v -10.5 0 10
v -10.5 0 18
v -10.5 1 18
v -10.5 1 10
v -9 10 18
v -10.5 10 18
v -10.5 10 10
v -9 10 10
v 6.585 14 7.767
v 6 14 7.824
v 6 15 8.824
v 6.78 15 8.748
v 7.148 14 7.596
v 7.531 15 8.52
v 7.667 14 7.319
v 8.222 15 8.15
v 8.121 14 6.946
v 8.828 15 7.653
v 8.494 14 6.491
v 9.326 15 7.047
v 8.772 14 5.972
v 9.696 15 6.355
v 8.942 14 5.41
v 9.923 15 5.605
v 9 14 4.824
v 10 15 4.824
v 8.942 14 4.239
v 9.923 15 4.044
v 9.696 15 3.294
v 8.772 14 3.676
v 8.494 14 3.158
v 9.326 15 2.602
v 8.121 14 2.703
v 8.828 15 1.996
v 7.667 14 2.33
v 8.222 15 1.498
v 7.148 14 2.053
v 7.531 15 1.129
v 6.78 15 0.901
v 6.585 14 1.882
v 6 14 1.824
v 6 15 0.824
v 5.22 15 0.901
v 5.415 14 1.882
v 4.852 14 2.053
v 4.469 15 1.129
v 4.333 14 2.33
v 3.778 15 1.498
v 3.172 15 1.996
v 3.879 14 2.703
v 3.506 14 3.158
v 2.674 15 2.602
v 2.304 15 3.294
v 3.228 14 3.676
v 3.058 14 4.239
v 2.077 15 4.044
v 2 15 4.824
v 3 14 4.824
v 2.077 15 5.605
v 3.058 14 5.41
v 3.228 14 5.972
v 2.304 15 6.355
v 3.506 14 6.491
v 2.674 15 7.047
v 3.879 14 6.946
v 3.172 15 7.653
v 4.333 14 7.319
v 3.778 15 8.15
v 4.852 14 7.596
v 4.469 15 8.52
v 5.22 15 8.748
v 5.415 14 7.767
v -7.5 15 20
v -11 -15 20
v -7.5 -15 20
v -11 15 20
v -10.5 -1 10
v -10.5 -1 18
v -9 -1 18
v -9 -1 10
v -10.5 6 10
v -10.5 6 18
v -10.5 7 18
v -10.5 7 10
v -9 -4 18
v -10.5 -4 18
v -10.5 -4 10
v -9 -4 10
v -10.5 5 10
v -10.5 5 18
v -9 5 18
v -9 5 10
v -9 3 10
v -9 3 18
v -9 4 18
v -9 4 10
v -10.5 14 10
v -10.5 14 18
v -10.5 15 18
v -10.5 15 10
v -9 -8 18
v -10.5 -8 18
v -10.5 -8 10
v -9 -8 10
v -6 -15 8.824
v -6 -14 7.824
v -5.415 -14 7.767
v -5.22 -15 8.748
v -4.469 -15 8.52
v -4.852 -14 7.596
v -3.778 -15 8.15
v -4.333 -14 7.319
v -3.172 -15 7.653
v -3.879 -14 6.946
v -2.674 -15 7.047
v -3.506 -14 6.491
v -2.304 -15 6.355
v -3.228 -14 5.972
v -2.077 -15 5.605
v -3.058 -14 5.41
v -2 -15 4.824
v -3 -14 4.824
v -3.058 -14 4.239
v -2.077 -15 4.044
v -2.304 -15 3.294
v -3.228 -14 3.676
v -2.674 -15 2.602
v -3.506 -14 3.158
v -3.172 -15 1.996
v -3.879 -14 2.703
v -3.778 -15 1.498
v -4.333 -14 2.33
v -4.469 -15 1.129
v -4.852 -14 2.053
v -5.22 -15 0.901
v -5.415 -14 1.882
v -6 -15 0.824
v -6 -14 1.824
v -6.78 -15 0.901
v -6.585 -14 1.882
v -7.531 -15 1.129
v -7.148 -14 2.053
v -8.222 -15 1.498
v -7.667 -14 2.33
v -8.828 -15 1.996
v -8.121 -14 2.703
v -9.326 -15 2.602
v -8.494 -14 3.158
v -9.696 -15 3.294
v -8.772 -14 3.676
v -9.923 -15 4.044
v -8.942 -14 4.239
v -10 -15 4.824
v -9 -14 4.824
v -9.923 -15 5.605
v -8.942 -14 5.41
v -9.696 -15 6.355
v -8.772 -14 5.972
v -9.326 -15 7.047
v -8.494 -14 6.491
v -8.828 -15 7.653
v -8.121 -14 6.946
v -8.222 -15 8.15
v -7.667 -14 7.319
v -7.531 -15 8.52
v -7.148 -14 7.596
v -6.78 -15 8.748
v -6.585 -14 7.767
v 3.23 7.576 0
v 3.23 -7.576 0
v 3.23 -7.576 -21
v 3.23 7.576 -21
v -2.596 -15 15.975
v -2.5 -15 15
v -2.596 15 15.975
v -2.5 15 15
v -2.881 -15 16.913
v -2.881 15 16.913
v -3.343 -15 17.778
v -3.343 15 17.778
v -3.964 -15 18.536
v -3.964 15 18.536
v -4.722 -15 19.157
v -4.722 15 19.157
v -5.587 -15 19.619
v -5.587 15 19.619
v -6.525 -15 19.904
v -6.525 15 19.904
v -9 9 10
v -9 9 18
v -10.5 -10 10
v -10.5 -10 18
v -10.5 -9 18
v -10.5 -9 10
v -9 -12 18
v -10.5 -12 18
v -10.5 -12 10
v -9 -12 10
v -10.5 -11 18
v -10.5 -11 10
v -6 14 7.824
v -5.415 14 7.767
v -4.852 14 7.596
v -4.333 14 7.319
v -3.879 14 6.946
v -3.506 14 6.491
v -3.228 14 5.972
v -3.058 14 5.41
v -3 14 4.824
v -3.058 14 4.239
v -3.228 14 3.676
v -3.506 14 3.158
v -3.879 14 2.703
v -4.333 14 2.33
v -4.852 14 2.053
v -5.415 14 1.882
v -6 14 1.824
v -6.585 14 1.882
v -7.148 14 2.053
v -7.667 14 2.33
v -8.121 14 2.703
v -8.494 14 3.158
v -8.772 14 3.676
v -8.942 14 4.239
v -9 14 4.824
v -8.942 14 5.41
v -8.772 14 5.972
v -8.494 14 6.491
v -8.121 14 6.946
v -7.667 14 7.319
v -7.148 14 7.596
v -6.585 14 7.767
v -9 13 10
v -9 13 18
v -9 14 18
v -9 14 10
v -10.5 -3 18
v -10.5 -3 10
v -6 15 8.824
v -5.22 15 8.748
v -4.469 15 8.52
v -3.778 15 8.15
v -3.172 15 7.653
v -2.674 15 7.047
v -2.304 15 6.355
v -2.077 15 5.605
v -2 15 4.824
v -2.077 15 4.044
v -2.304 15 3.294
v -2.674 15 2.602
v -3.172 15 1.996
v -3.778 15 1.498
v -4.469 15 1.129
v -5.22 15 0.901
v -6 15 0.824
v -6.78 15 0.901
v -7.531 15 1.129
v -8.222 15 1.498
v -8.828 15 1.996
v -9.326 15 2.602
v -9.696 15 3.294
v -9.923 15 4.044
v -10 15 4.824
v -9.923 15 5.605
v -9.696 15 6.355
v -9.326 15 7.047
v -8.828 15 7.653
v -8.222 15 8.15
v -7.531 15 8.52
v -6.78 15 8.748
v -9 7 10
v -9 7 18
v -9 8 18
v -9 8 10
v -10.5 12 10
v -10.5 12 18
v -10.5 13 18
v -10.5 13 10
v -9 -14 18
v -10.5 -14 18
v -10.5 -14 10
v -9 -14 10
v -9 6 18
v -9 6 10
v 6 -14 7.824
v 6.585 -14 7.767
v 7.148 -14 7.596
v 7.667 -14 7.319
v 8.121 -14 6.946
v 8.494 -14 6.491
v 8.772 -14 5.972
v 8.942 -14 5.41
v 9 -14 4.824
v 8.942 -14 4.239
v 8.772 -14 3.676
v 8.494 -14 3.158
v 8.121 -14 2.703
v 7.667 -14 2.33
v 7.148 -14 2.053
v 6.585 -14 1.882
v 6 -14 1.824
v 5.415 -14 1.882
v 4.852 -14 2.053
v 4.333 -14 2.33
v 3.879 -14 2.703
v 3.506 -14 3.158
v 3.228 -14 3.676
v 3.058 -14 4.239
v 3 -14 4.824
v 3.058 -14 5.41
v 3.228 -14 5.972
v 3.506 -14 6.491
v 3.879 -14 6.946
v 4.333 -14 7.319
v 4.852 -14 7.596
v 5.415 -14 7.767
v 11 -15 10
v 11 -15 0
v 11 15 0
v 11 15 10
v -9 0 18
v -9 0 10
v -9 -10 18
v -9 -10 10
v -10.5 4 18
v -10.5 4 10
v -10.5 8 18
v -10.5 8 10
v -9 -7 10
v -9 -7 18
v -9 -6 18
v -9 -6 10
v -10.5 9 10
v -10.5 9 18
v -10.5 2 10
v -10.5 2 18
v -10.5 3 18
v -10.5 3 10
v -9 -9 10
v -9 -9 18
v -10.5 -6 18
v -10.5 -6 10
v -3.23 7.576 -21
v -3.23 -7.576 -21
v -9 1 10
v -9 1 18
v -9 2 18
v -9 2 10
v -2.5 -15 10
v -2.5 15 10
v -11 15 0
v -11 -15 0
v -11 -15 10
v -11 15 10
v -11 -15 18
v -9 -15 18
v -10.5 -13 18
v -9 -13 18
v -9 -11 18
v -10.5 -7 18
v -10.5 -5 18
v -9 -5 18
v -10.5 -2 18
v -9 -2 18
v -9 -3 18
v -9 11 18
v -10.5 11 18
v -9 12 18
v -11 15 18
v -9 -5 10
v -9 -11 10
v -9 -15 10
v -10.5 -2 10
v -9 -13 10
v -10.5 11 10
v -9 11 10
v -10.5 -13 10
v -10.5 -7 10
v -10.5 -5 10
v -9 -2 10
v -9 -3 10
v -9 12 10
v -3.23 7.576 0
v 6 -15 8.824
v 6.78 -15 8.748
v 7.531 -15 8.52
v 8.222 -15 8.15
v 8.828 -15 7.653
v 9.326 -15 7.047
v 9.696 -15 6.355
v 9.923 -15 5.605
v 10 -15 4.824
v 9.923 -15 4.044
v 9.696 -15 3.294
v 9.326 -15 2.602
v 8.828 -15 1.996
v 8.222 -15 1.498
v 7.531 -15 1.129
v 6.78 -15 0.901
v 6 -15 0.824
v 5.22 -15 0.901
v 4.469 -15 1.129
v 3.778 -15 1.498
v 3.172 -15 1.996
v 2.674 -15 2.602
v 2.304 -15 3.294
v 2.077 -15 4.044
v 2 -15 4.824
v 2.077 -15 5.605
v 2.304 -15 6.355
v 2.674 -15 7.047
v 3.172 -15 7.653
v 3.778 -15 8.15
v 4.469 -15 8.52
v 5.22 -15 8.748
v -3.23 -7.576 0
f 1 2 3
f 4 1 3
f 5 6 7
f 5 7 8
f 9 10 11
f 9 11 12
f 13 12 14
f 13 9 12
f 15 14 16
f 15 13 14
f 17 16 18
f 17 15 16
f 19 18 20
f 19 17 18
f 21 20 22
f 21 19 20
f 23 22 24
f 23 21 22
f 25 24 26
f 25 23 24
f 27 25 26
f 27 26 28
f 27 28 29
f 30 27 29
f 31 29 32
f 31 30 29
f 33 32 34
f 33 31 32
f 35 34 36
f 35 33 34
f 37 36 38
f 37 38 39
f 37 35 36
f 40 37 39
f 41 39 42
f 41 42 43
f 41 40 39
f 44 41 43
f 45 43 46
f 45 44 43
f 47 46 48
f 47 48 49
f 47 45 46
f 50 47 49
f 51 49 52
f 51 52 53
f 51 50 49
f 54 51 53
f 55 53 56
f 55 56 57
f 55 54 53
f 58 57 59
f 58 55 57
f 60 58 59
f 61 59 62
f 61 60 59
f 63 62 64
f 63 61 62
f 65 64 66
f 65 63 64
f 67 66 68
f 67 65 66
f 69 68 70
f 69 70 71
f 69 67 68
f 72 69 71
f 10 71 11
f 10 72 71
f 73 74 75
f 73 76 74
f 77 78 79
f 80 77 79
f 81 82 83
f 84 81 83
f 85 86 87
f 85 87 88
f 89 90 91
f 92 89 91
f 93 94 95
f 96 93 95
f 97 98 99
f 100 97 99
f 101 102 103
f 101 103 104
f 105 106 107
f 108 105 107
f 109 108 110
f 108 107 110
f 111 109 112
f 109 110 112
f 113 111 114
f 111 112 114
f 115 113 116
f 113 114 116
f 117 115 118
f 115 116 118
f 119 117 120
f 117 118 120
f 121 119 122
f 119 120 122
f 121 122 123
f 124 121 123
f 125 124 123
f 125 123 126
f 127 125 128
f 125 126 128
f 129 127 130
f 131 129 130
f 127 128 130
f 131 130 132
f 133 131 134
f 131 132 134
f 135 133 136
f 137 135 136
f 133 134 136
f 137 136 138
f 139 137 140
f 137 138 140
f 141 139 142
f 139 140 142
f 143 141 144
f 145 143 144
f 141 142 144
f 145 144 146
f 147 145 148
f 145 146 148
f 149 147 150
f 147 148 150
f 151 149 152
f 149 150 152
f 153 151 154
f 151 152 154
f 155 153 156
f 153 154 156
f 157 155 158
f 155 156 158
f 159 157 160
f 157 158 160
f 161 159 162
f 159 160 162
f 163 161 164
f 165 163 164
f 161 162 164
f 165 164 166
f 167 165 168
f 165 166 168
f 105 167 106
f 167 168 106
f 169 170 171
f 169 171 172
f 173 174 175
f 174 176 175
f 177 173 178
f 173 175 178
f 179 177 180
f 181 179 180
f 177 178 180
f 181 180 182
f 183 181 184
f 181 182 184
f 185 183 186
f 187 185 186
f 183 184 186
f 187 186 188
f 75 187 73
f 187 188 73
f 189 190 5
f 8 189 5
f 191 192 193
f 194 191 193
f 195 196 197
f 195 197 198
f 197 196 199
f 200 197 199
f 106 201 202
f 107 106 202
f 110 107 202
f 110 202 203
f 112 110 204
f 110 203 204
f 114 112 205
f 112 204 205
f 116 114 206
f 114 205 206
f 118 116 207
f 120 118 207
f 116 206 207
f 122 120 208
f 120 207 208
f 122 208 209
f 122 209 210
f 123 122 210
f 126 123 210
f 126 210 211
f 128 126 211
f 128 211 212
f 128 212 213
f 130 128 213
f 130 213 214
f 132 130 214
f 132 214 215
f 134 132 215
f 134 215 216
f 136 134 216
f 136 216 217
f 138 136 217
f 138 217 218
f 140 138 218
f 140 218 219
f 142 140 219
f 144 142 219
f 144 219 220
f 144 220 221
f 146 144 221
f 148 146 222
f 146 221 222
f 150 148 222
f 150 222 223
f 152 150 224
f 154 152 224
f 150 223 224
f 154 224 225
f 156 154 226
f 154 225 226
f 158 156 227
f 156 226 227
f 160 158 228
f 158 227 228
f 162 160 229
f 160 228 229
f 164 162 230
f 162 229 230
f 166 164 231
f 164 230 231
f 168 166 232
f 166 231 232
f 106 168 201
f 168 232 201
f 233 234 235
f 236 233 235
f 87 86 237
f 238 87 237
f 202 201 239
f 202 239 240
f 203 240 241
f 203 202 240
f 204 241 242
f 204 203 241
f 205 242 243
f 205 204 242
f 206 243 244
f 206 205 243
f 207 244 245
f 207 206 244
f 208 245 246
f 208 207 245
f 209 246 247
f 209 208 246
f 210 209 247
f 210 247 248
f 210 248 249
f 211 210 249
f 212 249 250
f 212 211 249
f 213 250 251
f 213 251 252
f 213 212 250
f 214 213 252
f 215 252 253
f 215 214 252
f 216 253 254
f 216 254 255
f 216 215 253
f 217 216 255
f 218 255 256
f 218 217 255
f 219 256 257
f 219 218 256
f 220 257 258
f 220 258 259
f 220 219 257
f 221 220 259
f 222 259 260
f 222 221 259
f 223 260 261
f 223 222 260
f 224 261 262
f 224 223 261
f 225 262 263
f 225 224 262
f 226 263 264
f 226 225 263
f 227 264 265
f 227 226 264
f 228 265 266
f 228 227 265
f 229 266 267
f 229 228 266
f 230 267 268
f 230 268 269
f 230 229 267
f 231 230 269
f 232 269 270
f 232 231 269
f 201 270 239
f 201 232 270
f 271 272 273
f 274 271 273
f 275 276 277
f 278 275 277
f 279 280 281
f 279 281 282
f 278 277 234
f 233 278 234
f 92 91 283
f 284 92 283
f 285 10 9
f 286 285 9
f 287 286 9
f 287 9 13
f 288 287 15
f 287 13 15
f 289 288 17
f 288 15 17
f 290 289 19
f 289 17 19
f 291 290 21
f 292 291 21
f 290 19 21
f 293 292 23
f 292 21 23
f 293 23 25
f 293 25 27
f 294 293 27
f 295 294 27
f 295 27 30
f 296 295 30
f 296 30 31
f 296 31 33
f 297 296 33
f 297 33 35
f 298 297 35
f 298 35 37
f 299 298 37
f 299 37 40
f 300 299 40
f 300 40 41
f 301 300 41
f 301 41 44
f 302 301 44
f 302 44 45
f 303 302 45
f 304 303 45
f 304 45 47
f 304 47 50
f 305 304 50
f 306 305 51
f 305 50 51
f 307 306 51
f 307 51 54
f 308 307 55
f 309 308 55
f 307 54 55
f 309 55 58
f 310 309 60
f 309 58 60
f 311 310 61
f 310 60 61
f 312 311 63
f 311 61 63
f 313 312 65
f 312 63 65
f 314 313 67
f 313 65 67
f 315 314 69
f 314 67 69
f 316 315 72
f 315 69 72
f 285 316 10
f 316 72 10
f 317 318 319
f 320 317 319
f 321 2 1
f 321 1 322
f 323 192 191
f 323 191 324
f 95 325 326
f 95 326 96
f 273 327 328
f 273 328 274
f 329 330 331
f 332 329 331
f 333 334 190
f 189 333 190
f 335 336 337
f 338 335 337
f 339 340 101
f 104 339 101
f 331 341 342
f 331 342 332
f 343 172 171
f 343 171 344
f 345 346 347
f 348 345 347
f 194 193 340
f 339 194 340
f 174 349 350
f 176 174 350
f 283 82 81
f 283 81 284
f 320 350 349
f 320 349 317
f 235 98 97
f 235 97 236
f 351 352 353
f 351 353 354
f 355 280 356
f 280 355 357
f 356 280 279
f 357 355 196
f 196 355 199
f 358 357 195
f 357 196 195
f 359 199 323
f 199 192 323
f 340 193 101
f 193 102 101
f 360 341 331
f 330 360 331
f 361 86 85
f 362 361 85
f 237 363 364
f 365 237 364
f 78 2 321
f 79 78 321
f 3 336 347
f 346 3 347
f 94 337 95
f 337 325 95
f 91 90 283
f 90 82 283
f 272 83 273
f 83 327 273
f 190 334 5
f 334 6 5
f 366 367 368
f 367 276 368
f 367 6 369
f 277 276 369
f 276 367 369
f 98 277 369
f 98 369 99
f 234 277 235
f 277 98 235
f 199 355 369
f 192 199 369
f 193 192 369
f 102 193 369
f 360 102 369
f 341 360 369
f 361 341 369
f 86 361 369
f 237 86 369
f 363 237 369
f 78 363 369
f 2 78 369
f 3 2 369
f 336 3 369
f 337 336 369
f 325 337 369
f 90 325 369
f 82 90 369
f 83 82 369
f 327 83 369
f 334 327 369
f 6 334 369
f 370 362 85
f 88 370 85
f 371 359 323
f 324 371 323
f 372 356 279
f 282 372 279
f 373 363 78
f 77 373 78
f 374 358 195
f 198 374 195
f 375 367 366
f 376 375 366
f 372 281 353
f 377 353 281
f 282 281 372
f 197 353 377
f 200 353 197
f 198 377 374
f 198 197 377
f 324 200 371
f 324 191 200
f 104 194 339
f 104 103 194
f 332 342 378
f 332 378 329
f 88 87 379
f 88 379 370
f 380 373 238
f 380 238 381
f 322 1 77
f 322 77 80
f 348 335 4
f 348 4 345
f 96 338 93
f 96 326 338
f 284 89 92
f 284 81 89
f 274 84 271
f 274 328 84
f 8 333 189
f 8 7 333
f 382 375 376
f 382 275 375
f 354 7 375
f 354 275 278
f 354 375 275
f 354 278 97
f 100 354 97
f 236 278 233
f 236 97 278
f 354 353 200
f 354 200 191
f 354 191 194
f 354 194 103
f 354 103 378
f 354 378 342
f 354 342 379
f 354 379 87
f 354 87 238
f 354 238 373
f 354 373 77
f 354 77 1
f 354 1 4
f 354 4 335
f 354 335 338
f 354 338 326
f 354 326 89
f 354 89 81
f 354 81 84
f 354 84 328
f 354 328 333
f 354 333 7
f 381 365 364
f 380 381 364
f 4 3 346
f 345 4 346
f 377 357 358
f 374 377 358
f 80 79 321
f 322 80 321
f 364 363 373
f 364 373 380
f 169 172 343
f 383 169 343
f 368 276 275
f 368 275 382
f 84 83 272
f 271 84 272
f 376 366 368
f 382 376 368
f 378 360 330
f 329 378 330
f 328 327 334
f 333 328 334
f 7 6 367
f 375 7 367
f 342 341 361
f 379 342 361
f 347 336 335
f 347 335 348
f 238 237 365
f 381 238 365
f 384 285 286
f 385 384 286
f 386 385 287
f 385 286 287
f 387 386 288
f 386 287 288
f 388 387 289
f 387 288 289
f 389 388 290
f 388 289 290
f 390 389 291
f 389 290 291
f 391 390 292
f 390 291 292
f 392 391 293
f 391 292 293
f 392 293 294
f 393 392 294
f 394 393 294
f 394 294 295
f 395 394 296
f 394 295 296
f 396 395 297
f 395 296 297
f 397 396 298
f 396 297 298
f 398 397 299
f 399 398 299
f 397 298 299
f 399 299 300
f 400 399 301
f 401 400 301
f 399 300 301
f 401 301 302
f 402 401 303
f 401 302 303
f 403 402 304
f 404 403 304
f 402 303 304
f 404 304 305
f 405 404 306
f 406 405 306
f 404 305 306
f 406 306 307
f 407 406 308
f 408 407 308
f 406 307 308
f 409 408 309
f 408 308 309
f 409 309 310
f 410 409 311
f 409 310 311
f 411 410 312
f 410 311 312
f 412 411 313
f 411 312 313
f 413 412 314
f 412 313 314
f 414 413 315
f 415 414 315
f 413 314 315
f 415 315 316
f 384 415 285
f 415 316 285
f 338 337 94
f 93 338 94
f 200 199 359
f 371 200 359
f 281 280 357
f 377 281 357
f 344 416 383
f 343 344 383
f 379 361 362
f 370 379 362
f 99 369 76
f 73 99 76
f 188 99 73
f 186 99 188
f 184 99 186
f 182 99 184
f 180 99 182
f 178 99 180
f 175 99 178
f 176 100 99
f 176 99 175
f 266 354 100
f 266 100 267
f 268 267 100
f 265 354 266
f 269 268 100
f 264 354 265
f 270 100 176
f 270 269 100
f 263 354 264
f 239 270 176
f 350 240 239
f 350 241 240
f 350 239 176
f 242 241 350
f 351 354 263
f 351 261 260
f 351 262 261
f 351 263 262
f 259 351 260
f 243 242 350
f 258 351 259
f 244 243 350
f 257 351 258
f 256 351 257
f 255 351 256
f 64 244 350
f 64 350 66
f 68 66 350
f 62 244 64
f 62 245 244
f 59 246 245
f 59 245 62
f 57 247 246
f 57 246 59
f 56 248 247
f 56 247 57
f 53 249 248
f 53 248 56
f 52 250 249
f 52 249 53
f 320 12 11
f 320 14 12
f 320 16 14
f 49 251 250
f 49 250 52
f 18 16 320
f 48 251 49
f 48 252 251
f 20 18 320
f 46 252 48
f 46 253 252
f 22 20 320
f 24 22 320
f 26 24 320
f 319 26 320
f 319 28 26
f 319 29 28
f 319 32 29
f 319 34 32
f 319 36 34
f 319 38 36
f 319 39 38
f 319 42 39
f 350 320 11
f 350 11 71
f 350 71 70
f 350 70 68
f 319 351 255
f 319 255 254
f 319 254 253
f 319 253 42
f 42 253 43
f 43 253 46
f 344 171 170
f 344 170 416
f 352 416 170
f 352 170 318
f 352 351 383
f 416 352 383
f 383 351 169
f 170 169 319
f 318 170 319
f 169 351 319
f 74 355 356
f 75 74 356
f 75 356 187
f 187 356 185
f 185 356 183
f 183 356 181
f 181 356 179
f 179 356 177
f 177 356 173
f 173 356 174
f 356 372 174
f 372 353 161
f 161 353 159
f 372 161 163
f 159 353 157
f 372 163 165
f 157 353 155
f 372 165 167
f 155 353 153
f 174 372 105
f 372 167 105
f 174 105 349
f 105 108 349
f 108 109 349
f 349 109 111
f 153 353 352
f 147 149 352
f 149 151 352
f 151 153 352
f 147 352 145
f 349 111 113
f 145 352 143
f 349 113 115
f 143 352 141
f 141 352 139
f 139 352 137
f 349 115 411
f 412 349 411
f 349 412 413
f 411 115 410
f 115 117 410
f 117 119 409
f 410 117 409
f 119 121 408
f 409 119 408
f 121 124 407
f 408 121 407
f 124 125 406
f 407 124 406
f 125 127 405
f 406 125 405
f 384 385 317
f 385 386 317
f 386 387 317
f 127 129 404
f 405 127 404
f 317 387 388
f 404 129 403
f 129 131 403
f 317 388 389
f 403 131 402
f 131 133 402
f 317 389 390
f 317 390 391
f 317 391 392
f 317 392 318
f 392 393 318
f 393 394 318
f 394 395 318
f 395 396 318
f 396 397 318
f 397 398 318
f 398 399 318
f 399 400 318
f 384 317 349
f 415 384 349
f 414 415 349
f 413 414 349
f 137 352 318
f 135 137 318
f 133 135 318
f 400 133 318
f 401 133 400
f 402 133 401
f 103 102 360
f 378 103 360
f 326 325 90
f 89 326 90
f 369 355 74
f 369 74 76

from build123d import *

# Parameters (mm, degrees)
SKETCH1_W           = 22
SKETCH1_H           = 30
BOSS_EXTRUDE1_DEPTH = 10
SKETCH2_R           = 3
CUT_EXTRUDE1_DEPTH  = 44
SKETCH3_W           = 8.5
SKETCH3_H           = 30
BOSS_EXTRUDE2_DEPTH = 10
SKETCH4_W           = 1.5
SKETCH4_H           = 1
CUT_EXTRUDE2_DEPTH  = 8
SKETCH5_W           = 6.460308978
SKETCH5_H           = 15.152222924
BOSS_EXTRUDE3_DEPTH = 21
CHAMFER1_SIZE       = 1
FILLET1_R           = 5


with BuildPart() as part:
    # Sketch1 → Boss-Extrude1 (new body)
    with BuildSketch(Plane.XY):
        Rectangle(SKETCH1_W, SKETCH1_H)
    extrude(amount=BOSS_EXTRUDE1_DEPTH)

    # Sketch2 → Cut-Extrude1 (cut)
    with BuildSketch(Plane(origin=(0, 15, 0), x_dir=(1, 0, 0), z_dir=(0, 1, 0))):
        with Locations(Location((-6, -4.824366767, 0), (0, 0, 270))):
            Circle(SKETCH2_R)
        with Locations(Location((6, -4.824366767, 0), (0, 0, 270))):
            Circle(SKETCH2_R)
    extrude(amount=-CUT_EXTRUDE1_DEPTH, mode=Mode.SUBTRACT)

    # Sketch3 → Boss-Extrude2 (add)
    with BuildSketch(Plane.XY.offset(10)):
        with Locations((-6.75, 0)):
            Rectangle(SKETCH3_W, SKETCH3_H)
    extrude(amount=BOSS_EXTRUDE2_DEPTH)

    # Sketch4 → Cut-Extrude2 (cut)
    with BuildSketch(Plane.XY.offset(18)):
        Polygon((-10.5, 14), (-10.5, 15), (-11, 15), (-11, -15), (-10.5, -15), (-10.5, -14), (-10.5, -13), (-10.5, -12), (-10.5, -11), (-10.5, -10), (-10.5, -9), (-10.5, -8), (-10.5, -7), (-10.5, -6), (-10.5, -5), (-10.5, -4), (-10.5, -3), (-10.5, -2), (-10.5, -1), (-10.5, 0), (-10.5, 1), (-10.5, 2), (-10.5, 3), (-10.5, 4), (-10.5, 5), (-10.5, 6), (-10.5, 7), (-10.5, 8), (-10.5, 9), (-10.5, 10), (-10.5, 11), (-10.5, 12), (-10.5, 13), align=None)
        with Locations((-9.75, 13.5)):
            Rectangle(SKETCH4_W, SKETCH4_H)
        with Locations((-9.75, 11.5)):
            Rectangle(SKETCH4_W, SKETCH4_H)
        with Locations((-9.75, 9.5)):
            Rectangle(SKETCH4_W, SKETCH4_H)
        with Locations((-9.75, 7.5)):
            Rectangle(SKETCH4_W, SKETCH4_H)
        with Locations((-9.75, 5.5)):
            Rectangle(SKETCH4_W, SKETCH4_H)
        with Locations((-9.75, 3.5)):
            Rectangle(SKETCH4_W, SKETCH4_H)
        with Locations((-9.75, 1.5)):
            Rectangle(SKETCH4_W, SKETCH4_H)
        with Locations((-9.75, -0.5)):
            Rectangle(SKETCH4_W, SKETCH4_H)
        with Locations((-9.75, -2.5)):
            Rectangle(SKETCH4_W, SKETCH4_H)
        with Locations((-9.75, -4.5)):
            Rectangle(SKETCH4_W, SKETCH4_H)
        with Locations((-9.75, -6.5)):
            Rectangle(SKETCH4_W, SKETCH4_H)
        with Locations((-9.75, -8.5)):
            Rectangle(SKETCH4_W, SKETCH4_H)
        with Locations((-9.75, -10.5)):
            Rectangle(SKETCH4_W, SKETCH4_H)
        with Locations((-9.75, -12.5)):
            Rectangle(SKETCH4_W, SKETCH4_H)
        with Locations((-9.75, -14.5)):
            Rectangle(SKETCH4_W, SKETCH4_H)
    extrude(amount=-CUT_EXTRUDE2_DEPTH, mode=Mode.SUBTRACT)

    # Sketch5 → Boss-Extrude3 (add)
    with BuildSketch(Plane(origin=(0, 0, 0), x_dir=(-1, 0, 0), z_dir=(0, 0, -1))):
        Rectangle(SKETCH5_W, SKETCH5_H)
    extrude(amount=BOSS_EXTRUDE3_DEPTH)

    # Chamfer1
    chamfer1_edges = [part.edges().sort_by_distance(p)[0] for p in [
        (-6, -15, 1.824366767),
        (-6, 15, 1.824366767),
        (6, -15, 1.824366767),
        (6, 15, 1.824366767),
    ]]
    chamfer(chamfer1_edges, length=CHAMFER1_SIZE)

    # Fillet1
    fillet1_edges = [part.edges().sort_by_distance(p)[0] for p in [
        (-2.5, 0, 20),
    ]]
    fillet(fillet1_edges, radius=FILLET1_R)


solid = part.part
